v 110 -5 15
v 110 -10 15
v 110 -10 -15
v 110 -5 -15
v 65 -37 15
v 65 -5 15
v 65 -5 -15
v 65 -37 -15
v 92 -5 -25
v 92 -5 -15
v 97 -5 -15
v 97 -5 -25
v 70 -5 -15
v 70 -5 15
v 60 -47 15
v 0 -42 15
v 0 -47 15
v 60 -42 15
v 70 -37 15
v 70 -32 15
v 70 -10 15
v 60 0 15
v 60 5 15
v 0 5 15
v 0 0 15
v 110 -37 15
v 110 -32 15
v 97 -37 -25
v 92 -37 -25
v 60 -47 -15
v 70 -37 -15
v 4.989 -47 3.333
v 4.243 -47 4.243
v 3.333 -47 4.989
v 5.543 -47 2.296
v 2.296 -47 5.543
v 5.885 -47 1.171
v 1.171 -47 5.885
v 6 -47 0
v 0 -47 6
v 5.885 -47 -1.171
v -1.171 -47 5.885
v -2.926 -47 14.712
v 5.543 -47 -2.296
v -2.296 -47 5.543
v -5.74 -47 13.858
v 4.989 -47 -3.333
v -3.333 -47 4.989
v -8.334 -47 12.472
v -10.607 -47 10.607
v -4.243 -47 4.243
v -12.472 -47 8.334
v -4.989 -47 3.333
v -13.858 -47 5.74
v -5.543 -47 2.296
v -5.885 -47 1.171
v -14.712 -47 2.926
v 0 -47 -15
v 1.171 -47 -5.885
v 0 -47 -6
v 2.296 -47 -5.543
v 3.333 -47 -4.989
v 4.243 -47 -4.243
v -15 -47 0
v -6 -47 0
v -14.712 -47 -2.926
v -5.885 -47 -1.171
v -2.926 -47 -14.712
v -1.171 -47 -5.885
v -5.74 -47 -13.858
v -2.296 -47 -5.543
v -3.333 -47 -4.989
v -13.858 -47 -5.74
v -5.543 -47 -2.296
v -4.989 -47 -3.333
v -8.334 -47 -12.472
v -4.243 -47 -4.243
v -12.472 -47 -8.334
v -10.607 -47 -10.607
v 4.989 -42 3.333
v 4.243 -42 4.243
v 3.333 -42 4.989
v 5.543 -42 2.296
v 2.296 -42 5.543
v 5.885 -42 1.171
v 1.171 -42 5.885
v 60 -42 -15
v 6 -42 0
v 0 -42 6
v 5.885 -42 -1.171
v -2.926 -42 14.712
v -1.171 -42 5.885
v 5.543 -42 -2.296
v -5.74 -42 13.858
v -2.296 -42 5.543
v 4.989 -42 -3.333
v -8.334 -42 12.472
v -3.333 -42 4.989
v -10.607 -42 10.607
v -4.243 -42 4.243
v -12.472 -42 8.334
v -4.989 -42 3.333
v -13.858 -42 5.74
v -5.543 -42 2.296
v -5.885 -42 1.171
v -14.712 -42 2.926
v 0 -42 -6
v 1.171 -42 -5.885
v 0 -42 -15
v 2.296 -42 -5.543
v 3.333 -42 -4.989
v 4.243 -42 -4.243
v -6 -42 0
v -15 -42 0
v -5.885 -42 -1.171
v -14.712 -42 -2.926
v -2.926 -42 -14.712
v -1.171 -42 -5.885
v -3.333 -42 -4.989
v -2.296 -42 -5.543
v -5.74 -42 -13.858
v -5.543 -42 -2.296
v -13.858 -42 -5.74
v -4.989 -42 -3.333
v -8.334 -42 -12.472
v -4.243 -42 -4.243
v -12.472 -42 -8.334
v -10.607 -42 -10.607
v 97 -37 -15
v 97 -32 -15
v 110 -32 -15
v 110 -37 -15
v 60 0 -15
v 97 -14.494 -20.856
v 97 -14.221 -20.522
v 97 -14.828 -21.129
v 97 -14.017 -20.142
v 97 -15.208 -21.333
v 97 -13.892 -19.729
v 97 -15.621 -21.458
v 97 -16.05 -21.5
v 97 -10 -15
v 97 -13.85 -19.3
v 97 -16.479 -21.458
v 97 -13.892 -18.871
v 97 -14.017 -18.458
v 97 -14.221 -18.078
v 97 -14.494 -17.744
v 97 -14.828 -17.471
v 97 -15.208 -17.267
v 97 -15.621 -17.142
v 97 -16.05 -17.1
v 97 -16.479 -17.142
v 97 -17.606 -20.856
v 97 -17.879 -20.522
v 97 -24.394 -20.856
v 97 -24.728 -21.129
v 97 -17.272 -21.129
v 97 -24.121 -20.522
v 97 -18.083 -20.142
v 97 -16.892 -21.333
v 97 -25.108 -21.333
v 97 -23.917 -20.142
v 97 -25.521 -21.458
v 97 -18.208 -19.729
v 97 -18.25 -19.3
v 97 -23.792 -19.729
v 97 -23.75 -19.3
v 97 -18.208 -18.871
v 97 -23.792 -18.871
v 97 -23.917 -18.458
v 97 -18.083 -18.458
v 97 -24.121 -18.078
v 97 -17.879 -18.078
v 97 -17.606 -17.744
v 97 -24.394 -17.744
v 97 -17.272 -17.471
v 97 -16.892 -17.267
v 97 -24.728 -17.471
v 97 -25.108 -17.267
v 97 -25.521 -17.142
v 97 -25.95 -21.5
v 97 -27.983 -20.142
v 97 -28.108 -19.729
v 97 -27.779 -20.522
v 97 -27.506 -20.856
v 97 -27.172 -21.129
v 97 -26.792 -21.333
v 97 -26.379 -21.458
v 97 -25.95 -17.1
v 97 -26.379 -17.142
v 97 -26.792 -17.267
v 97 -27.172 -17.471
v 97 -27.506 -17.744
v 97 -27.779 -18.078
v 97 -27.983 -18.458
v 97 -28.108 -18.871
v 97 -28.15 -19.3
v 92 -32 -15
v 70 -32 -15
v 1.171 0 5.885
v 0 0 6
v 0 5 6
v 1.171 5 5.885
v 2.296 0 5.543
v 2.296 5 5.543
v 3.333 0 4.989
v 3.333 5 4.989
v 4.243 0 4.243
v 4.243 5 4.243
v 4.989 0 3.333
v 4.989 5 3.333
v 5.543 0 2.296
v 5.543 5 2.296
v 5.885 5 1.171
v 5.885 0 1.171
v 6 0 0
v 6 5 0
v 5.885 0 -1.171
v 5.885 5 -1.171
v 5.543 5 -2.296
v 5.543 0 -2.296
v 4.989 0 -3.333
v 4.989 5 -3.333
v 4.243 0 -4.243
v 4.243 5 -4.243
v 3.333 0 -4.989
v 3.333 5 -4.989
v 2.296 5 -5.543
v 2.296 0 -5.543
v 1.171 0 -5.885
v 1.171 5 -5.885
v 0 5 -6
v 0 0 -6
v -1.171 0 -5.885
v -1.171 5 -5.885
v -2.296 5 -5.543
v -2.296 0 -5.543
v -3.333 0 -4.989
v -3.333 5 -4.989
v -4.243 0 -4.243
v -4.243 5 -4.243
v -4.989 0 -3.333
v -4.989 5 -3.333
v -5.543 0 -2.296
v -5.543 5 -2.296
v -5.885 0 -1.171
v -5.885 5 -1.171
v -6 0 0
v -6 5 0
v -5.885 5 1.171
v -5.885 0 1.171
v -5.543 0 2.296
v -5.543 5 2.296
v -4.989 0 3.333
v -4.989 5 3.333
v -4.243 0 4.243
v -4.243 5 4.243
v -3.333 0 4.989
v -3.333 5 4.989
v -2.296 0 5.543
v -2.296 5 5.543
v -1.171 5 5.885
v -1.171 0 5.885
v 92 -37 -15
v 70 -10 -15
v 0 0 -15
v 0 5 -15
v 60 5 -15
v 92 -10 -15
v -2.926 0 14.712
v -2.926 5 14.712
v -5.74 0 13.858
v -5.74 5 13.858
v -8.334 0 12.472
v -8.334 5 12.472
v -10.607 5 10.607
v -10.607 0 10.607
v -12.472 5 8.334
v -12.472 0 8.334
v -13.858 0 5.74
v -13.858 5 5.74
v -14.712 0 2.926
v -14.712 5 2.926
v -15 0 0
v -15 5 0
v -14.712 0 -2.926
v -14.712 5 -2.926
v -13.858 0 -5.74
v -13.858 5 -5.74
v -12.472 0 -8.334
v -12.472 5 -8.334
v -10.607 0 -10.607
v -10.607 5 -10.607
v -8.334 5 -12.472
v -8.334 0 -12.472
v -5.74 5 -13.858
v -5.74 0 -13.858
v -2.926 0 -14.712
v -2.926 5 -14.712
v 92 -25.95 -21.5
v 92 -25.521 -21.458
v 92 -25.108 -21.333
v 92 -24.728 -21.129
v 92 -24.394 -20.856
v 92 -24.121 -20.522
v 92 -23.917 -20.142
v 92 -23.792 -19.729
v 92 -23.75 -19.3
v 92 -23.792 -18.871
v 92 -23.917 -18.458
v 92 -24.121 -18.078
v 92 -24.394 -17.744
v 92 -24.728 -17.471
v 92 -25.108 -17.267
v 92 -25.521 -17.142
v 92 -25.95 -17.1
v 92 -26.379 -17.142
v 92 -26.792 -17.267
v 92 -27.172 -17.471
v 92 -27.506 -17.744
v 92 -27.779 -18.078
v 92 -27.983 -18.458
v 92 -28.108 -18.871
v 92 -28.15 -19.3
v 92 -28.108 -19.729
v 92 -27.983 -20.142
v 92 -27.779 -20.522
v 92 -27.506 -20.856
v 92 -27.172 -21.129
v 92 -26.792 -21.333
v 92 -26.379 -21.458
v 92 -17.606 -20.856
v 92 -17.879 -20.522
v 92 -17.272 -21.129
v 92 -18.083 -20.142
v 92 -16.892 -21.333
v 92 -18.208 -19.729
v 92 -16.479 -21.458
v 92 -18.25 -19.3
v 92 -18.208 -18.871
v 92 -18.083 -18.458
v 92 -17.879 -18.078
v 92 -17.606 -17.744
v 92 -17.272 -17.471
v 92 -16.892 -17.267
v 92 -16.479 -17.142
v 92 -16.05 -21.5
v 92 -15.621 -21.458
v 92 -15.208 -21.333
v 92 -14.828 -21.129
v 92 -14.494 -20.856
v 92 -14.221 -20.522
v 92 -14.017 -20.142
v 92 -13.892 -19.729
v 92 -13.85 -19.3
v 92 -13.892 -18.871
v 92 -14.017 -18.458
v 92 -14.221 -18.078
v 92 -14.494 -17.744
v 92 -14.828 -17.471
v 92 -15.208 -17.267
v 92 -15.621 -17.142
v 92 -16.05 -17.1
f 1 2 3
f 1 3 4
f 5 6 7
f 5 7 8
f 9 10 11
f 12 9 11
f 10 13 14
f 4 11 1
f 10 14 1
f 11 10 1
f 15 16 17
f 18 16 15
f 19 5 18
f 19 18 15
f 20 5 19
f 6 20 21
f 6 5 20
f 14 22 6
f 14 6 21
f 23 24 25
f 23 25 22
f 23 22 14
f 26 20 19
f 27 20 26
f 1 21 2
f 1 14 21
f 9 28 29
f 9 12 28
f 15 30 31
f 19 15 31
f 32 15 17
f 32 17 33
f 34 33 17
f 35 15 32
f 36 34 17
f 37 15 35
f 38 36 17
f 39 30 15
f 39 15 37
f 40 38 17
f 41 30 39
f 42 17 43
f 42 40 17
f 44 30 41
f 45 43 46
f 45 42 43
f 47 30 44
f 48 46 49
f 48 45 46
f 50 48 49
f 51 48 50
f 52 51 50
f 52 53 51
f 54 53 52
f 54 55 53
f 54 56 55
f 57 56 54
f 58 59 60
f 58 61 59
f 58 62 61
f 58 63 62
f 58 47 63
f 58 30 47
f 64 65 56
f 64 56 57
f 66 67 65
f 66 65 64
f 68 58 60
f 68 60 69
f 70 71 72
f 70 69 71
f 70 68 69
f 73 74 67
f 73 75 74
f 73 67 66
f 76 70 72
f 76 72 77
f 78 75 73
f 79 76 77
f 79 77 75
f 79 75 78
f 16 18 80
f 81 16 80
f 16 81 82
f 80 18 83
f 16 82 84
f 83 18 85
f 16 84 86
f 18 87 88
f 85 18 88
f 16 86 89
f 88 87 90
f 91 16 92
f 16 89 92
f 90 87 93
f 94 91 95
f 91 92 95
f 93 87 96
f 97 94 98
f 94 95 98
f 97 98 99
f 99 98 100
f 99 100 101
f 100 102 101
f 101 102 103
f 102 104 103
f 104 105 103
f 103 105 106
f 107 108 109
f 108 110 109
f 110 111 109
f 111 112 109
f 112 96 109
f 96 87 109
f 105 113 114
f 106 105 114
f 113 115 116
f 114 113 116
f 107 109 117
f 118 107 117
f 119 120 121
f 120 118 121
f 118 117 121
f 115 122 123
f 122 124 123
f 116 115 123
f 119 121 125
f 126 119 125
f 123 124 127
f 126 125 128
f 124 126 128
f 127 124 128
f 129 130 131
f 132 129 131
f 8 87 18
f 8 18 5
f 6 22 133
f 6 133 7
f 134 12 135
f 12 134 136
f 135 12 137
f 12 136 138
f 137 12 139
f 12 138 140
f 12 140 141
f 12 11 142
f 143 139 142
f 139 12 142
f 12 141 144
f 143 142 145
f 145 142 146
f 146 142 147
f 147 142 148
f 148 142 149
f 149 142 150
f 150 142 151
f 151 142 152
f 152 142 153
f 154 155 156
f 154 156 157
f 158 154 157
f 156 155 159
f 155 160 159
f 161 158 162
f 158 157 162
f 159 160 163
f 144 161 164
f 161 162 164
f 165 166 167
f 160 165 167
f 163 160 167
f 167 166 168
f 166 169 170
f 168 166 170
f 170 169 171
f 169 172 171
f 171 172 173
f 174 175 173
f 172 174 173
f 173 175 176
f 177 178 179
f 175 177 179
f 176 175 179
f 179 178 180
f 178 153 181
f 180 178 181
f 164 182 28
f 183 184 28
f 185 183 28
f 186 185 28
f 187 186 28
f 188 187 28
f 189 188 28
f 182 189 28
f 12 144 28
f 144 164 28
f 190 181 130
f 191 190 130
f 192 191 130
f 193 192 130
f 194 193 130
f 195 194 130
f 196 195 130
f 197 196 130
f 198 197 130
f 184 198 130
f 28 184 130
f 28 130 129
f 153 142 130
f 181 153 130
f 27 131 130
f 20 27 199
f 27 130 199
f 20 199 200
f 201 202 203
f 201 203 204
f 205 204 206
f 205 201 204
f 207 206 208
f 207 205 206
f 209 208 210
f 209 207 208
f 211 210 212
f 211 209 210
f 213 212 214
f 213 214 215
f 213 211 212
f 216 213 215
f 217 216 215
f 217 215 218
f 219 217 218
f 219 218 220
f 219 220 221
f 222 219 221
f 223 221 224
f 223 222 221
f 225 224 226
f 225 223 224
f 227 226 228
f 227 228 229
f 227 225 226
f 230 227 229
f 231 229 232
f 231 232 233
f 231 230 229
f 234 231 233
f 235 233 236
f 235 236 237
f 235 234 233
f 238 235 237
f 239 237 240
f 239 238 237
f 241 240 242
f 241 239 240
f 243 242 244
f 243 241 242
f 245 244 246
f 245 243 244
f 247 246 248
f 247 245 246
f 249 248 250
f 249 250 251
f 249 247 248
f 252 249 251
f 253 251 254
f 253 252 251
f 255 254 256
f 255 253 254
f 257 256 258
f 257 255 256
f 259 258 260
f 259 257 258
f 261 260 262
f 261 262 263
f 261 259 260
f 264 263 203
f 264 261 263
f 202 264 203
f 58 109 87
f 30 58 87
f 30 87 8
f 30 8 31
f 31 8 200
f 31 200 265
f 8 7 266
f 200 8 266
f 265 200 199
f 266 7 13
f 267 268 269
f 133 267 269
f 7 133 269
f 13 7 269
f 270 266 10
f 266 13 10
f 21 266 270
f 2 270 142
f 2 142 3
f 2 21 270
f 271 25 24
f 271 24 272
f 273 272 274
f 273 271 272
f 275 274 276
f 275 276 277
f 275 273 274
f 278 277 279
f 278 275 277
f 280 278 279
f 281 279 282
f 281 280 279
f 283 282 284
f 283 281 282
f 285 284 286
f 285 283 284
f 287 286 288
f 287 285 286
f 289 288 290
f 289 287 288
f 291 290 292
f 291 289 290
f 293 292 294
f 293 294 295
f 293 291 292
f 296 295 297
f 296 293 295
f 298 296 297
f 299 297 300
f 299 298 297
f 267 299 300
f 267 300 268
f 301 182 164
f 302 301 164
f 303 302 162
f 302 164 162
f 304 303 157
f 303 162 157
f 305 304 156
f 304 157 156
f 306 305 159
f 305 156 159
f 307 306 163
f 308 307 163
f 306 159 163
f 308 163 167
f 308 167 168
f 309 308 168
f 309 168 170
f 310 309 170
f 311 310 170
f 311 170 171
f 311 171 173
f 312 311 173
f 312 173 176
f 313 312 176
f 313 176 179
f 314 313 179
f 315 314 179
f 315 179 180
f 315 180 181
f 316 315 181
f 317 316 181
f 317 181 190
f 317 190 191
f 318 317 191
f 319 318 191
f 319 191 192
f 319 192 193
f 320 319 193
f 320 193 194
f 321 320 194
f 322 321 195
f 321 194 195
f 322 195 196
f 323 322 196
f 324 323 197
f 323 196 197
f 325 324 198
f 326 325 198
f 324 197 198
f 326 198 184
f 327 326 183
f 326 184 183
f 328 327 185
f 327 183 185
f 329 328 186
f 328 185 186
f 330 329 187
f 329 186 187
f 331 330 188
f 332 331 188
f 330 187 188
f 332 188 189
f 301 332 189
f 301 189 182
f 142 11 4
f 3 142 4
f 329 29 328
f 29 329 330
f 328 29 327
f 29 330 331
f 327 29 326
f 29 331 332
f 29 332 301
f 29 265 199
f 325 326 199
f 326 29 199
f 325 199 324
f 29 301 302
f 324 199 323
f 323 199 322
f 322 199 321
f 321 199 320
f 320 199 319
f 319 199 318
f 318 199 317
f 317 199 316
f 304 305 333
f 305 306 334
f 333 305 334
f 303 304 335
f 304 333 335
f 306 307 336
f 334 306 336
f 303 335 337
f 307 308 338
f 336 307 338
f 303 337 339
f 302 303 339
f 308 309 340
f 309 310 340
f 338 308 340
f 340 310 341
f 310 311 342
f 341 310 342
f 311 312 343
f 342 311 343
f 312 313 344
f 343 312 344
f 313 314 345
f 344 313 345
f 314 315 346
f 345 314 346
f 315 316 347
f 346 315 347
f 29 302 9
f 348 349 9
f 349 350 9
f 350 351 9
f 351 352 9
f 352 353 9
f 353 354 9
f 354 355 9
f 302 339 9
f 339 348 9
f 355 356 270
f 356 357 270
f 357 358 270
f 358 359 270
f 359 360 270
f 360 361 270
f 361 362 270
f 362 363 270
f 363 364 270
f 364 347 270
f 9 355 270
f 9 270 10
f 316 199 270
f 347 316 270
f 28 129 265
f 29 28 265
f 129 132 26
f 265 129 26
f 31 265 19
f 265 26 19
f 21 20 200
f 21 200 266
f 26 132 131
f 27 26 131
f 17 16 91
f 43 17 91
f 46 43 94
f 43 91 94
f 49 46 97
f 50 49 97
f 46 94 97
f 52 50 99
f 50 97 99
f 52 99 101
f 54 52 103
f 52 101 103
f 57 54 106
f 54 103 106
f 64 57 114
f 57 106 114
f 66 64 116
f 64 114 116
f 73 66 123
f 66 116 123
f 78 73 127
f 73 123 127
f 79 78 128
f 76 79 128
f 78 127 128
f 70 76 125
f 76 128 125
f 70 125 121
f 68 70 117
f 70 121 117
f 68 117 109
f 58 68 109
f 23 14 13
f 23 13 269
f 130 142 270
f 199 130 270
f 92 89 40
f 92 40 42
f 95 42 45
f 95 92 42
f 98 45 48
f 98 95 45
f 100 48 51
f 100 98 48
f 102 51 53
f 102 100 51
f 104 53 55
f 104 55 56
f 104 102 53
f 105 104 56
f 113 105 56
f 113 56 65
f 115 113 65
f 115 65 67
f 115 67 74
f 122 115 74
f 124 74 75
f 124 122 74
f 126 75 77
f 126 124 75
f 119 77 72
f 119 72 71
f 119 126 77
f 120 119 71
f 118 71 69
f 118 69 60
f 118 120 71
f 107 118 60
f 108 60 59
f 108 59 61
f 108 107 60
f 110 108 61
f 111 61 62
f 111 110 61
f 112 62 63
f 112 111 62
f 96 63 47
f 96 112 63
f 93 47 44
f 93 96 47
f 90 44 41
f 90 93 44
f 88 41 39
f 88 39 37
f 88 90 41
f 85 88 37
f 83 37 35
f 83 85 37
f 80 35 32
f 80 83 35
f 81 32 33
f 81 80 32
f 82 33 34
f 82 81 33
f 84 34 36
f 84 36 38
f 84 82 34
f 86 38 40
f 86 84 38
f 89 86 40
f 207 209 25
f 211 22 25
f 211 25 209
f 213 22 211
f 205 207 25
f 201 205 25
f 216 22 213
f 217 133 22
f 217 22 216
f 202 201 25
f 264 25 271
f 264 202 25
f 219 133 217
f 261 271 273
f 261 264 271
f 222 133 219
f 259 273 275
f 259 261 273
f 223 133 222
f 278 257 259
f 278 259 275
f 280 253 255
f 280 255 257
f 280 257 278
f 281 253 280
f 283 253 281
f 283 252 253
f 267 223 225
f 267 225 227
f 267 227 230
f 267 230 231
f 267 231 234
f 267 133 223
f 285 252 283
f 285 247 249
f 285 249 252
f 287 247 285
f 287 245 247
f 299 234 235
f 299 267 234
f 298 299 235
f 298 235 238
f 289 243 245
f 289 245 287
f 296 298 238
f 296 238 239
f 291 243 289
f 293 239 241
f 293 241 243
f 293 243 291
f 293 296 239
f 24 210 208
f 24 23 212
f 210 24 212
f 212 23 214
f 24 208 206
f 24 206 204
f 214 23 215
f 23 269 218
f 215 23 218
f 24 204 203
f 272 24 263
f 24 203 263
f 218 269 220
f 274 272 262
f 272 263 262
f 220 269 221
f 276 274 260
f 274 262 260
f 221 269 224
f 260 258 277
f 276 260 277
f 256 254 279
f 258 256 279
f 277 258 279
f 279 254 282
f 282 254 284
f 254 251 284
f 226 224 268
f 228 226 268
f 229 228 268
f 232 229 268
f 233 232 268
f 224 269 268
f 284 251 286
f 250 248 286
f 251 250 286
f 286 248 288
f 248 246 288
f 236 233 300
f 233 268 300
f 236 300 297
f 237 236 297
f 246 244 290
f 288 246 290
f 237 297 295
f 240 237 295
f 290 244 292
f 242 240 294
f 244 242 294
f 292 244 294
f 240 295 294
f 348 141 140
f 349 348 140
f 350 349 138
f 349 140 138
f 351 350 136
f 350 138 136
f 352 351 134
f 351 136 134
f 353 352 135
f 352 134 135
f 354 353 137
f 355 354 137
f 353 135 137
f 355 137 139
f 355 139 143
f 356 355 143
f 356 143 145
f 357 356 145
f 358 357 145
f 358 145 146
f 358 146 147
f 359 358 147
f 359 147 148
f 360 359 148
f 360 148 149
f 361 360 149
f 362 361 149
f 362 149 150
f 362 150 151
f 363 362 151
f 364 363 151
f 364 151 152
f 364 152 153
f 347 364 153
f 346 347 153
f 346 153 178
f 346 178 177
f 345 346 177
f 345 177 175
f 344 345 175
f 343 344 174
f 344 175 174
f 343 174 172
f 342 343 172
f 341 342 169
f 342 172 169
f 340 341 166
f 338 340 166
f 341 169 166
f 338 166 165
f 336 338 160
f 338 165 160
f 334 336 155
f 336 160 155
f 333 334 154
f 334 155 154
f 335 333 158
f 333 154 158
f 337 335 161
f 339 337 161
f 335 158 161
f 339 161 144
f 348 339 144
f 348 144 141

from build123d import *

# Parameters (mm, degrees)
SKETCH1_R           = 6
BOSS_EXTRUDE4_DEPTH = 5
BOSS_EXTRUDE5_DEPTH = 30
BOSS_EXTRUDE6_DEPTH = 30
SKETCH11_R          = 6
BOSS_EXTRUDE7_DEPTH = 5
BOSS_EXTRUDE8_DEPTH = 30
BOSS_EXTRUDE9_DEPTH = 10
CUT_EXTRUDE2_REACH  = 126.008
SKETCH14_R          = 2.2


with BuildPart() as part:
    # Sketch1 → Boss-Extrude4 (new body)
    with BuildSketch(Plane(origin=(0, 0, 0), x_dir=(1, 0, 0), z_dir=(0, 1, 0))):
        with BuildLine():
            Line((0, 15), (60, 15))
            Line((60, 15), (60, -15))
            Line((60, -15), (0, -15))
            ThreePointArc((0, -15), (-15, 0), (0, 15))
        make_face()
        with Locations(Location((0, 0, 0), (0, 0, 270))):
            Circle(SKETCH1_R, mode=Mode.SUBTRACT)
    extrude(amount=BOSS_EXTRUDE4_DEPTH)

    # Sketch8 → Boss-Extrude5 (add)
    with BuildSketch(Plane.XY.offset(15)):
        Polygon((60, 0), (70, -10), (110, -10), (110, -5), (70, -5), (60, 5), align=None)
    extrude(amount=-BOSS_EXTRUDE5_DEPTH)

    # Sketch9 → Boss-Extrude6 (add)
    with BuildSketch(Plane.XY.offset(15)):
        Polygon((70, -10), (70, -21), (65, -21), (65, -5), align=None)
    boss_extrude6 = extrude(amount=-BOSS_EXTRUDE6_DEPTH)

    # Mirror3: Boss-Extrude6 across plane
    add(boss_extrude6.mirror(Plane(origin=(70, -21, -15), x_dir=(0, 0, 1), z_dir=(0, -1, 0))))



with BuildPart() as body_2:
    # Sketch11 → Boss-Extrude7 (new body)
    with BuildSketch(Plane(origin=(0, -42, 0), x_dir=(-1, 0, 0), z_dir=(0, -1, 0))):
        with BuildLine():
            Line((0, 15), (-60, 15))
            Line((-60, 15), (-60, -15))
            Line((-60, -15), (0, -15))
            ThreePointArc((0, -15), (15, 0), (0, 15))
        make_face()
        with Locations(Location((0, 0, 0), (0, 0, 270))):
            Circle(SKETCH11_R, mode=Mode.SUBTRACT)
    extrude(amount=BOSS_EXTRUDE7_DEPTH)


with BuildPart() as part_1:
    add(part.part)

    add(body_2.part)  # Boss-Extrude8 merges body 2
    # Sketch12 → Boss-Extrude8 (add)
    with BuildSketch(Plane(origin=(0, 0, -15), x_dir=(-1, 0, 0), z_dir=(0, 0, -1))):
        Polygon((-70, -32), (-65, -37), (-60, -42), (-60, -47), (-70, -37), (-110, -37), (-110, -32), align=None)
    extrude(amount=-BOSS_EXTRUDE8_DEPTH)

    # Sketch13 → Boss-Extrude9 (add)
    with BuildSketch(Plane(origin=(0, 0, -15), x_dir=(-1, 0, 0), z_dir=(0, 0, -1))):
        Polygon((-97, -10), (-97, -37), (-92, -37), (-92, -5), (-97, -5), align=None)
    extrude(amount=BOSS_EXTRUDE9_DEPTH)

    # Sketch14 → Cut-Extrude2 (cut, up to next)
    with BuildSketch(Plane(origin=(97, 0, 0), x_dir=(0, 0, -1), z_dir=(1, 0, 0)), mode=Mode.PRIVATE) as cut_extrude2_sk1:
        with Locations((19.3, -16.05)):
            Circle(SKETCH14_R)
    cut_extrude2_tool1 = extrude(cut_extrude2_sk1.sketch, amount=-CUT_EXTRUDE2_REACH, mode=Mode.PRIVATE) & part_1.part
    # Sketch14 → Cut-Extrude2 (cut, up to next)
    with BuildSketch(Plane(origin=(97, 0, 0), x_dir=(0, 0, -1), z_dir=(1, 0, 0)), mode=Mode.PRIVATE) as cut_extrude2_sk2:
        with Locations((19.3, -25.95)):
            Circle(SKETCH14_R)
    cut_extrude2_tool2 = extrude(cut_extrude2_sk2.sketch, amount=-CUT_EXTRUDE2_REACH, mode=Mode.PRIVATE) & part_1.part
    add(cut_extrude2_tool1.solids().sort_by_distance((97, -16.05, -19.3))[0], mode=Mode.SUBTRACT)
    add(cut_extrude2_tool2.solids().sort_by_distance((97, -25.95, -19.3))[0], mode=Mode.SUBTRACT)


solid = part_1.part
